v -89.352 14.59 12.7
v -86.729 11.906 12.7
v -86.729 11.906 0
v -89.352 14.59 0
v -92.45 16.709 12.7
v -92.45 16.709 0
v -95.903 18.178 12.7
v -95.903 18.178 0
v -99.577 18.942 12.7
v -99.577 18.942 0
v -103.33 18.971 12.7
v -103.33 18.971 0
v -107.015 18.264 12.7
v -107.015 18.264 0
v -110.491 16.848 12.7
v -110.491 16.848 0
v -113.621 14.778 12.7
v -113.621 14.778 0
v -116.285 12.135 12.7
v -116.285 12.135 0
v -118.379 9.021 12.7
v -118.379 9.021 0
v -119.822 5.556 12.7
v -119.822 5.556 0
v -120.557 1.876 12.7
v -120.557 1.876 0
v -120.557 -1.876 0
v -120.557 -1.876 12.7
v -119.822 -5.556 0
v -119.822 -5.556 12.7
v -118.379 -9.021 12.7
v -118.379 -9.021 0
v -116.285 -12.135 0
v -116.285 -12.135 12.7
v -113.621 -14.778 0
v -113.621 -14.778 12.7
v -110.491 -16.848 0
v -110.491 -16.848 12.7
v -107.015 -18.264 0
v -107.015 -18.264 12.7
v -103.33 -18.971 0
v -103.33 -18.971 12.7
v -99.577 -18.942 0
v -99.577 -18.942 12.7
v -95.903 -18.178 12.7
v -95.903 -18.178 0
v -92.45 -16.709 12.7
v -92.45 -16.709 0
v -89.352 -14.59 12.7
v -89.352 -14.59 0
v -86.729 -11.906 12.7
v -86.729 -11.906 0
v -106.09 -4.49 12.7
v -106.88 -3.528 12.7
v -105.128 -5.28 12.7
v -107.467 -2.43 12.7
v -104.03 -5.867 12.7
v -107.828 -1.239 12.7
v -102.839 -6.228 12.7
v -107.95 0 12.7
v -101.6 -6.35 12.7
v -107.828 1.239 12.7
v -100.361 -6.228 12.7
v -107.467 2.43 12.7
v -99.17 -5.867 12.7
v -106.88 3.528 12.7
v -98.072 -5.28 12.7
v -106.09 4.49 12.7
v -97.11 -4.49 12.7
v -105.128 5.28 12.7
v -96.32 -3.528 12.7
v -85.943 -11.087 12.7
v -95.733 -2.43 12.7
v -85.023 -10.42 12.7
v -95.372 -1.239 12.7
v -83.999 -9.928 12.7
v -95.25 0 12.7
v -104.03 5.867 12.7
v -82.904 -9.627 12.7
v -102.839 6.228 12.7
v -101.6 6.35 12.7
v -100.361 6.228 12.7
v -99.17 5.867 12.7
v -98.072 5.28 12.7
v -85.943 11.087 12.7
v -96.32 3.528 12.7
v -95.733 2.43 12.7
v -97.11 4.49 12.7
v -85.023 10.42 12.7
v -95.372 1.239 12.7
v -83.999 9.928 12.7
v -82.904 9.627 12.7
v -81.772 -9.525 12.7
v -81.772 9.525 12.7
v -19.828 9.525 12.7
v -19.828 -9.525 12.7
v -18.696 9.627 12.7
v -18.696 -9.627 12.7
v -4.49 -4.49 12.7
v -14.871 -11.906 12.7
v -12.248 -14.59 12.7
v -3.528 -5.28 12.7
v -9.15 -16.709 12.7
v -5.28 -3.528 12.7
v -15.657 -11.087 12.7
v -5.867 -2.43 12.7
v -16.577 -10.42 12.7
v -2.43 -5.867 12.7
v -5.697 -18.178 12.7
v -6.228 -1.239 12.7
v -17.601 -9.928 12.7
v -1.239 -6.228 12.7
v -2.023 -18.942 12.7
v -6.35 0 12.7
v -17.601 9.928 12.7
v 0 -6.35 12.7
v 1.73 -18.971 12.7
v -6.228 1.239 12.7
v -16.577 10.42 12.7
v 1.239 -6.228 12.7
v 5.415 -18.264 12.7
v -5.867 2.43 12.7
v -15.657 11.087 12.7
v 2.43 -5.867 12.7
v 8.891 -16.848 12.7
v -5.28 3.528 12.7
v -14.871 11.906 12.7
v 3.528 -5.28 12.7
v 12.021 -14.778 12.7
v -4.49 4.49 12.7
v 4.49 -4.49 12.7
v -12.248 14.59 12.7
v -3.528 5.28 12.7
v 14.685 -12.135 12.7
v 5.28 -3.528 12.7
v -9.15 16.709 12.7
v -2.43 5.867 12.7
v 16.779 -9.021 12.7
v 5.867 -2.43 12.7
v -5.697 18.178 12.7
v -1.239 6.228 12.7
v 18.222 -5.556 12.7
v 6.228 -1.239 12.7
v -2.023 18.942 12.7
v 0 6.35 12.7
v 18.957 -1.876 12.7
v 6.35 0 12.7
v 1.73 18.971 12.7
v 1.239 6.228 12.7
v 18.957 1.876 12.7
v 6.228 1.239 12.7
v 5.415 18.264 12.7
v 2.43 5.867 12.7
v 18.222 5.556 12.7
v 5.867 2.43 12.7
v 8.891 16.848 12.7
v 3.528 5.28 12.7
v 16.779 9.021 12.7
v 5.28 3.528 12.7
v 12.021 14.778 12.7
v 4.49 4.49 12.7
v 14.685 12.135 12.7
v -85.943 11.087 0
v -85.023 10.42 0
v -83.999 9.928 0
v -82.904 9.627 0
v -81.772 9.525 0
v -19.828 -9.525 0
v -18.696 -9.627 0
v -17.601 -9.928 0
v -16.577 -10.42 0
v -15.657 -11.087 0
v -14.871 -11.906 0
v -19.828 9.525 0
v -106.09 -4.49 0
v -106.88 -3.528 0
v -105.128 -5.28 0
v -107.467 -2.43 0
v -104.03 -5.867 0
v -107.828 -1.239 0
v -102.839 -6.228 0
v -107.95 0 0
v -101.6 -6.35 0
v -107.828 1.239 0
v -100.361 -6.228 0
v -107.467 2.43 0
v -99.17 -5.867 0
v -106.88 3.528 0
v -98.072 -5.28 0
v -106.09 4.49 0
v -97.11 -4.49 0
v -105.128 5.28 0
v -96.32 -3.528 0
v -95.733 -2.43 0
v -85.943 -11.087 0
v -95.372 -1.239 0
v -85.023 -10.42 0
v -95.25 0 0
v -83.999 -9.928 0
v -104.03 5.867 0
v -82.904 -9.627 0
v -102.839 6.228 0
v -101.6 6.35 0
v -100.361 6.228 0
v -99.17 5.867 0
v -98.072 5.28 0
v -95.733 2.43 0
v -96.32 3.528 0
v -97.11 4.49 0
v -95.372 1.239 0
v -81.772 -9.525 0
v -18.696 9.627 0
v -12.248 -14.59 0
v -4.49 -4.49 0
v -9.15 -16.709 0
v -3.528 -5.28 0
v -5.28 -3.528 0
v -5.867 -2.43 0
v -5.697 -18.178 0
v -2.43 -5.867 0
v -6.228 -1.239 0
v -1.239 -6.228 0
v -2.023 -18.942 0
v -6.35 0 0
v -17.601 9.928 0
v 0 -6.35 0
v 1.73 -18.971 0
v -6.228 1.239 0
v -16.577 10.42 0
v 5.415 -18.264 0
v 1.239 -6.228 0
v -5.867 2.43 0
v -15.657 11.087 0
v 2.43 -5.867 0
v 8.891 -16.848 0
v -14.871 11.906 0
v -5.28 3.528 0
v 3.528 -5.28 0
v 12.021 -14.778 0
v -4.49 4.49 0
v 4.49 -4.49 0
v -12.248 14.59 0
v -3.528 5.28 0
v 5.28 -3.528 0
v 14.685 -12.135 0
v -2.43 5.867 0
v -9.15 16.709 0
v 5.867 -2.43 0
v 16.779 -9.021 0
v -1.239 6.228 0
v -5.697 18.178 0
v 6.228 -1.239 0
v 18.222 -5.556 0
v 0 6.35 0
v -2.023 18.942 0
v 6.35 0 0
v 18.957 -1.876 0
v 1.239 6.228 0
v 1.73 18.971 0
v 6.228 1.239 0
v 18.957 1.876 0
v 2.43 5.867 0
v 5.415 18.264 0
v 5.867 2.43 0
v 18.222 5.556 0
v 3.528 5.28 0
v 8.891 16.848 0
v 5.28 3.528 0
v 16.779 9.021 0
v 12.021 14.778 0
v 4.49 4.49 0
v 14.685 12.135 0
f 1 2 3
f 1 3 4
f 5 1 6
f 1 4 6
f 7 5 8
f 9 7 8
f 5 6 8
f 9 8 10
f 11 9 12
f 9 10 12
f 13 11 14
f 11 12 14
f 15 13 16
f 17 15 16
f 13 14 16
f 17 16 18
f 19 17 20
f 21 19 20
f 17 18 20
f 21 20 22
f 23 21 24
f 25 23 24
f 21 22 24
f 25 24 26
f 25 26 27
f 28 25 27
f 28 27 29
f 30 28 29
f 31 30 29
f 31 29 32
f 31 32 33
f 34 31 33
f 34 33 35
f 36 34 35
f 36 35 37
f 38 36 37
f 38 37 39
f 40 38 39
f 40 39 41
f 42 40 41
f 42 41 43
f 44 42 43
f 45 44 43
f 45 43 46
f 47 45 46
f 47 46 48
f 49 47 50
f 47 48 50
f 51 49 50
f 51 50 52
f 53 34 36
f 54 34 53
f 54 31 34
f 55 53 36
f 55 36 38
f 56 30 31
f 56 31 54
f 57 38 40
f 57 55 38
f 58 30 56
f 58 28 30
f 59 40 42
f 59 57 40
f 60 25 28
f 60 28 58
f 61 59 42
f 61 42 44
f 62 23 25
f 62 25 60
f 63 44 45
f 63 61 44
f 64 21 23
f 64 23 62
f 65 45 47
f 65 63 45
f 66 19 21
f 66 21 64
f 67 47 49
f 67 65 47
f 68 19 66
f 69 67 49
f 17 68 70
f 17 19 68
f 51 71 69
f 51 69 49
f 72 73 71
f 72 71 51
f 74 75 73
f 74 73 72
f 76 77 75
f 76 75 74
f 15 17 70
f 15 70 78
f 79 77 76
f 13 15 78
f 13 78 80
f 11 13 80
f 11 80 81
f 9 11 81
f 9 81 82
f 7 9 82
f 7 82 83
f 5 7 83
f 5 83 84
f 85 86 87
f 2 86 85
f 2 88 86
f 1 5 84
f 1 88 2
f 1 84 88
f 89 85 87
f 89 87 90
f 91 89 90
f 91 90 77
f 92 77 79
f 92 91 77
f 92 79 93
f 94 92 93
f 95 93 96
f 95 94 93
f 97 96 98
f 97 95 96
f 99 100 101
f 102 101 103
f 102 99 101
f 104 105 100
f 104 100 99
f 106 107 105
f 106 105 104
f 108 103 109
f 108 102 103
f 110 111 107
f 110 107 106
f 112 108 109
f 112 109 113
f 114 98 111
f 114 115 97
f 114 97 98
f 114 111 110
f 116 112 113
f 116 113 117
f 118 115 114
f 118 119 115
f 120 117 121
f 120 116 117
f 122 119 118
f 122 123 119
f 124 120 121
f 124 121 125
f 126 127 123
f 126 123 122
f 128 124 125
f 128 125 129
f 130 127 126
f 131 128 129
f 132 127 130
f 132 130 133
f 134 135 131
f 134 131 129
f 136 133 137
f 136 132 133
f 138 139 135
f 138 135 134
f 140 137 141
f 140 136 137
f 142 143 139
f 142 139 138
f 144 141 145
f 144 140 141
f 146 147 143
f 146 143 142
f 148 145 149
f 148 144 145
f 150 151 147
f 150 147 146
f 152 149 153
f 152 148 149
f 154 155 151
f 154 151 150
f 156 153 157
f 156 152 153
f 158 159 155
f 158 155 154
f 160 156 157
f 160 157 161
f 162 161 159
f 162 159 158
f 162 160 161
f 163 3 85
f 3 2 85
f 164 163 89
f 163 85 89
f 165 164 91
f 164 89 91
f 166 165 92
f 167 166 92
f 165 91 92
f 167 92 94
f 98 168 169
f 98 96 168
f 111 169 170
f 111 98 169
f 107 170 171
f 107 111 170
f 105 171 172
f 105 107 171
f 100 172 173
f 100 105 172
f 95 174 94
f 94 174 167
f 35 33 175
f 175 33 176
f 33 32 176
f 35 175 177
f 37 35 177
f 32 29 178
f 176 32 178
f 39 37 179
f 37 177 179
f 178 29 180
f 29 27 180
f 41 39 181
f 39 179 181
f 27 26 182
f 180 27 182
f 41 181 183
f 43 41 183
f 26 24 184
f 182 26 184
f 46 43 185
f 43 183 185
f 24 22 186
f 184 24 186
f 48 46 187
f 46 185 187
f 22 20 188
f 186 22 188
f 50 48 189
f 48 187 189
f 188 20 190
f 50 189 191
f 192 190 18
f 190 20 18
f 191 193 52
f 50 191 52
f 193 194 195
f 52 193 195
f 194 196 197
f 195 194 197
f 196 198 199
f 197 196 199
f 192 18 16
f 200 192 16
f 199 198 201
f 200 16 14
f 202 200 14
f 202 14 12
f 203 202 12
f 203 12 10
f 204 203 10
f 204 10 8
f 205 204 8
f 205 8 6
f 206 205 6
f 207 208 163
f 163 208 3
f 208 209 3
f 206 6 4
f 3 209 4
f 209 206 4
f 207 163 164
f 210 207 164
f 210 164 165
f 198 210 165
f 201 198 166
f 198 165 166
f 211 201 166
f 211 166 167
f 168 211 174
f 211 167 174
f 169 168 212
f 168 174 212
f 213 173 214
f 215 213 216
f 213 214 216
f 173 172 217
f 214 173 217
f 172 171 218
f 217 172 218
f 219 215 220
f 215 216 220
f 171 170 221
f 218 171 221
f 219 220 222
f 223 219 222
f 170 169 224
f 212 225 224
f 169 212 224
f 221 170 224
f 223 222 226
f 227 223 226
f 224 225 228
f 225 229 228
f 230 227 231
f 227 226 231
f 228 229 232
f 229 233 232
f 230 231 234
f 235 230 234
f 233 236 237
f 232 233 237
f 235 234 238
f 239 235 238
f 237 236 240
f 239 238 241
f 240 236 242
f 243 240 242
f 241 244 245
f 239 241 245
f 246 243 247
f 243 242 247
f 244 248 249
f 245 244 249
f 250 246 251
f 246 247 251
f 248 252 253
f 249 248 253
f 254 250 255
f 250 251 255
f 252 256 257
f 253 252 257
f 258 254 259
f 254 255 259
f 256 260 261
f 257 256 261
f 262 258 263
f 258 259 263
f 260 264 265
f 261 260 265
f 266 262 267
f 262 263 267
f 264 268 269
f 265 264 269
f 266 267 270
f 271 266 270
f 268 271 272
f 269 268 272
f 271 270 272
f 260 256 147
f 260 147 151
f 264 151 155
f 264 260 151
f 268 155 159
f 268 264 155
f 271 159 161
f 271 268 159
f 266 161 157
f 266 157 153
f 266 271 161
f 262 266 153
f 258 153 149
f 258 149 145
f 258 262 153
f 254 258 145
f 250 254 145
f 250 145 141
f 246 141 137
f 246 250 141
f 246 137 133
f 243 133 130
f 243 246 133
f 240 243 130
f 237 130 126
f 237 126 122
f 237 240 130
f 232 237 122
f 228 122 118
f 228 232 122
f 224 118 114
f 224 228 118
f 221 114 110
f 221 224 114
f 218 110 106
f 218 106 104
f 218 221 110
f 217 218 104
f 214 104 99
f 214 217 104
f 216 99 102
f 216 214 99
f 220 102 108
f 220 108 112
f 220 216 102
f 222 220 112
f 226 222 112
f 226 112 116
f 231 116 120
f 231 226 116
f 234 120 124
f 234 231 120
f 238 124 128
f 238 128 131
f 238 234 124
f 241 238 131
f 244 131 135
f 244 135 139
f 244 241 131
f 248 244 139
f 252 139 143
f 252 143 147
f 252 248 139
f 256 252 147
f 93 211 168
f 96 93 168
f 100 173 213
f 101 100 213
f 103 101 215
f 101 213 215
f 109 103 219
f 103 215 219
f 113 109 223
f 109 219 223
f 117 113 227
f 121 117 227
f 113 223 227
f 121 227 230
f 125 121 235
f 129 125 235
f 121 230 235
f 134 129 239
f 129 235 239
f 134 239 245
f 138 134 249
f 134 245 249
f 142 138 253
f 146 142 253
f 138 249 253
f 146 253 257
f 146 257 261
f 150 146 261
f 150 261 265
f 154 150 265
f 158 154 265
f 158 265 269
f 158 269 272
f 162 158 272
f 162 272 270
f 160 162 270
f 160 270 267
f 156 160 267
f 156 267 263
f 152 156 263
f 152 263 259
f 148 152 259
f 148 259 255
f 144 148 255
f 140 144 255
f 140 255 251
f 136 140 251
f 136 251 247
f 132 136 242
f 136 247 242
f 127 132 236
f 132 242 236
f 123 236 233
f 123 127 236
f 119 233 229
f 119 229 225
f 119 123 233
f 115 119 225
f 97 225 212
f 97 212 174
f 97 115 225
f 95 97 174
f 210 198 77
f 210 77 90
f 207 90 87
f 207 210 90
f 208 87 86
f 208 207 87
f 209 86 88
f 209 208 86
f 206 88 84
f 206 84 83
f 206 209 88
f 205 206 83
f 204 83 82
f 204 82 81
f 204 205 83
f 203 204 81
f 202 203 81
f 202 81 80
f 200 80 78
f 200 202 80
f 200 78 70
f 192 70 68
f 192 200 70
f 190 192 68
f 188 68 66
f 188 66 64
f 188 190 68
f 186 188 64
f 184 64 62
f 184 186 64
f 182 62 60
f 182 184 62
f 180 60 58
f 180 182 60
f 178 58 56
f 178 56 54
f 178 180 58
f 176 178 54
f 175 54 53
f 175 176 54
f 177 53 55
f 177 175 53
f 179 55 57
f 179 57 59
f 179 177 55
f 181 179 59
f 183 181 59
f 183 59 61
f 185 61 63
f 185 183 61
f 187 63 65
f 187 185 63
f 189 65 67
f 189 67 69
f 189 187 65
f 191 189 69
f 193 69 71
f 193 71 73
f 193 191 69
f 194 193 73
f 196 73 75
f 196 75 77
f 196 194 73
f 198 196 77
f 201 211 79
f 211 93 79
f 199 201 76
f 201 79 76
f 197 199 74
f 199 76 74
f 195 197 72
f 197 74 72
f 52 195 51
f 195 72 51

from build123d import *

# Parameters (mm, degrees)
SKETCH1_R           = 6.35
BOSS_EXTRUDE1_DEPTH = 12.7
FILLET1_R           = 6.35


with BuildPart() as part:
    # Sketch1 → Boss-Extrude1 (new body)
    with BuildSketch(Plane.XY):
        with BuildLine():
            Line((-85.102216058, -9.525), (-16.497783942, -9.525))
            ThreePointArc((-16.497783942, -9.525), (19.05, 0), (-16.497783942, 9.525))
            Line((-16.497783942, 9.525), (-85.102216058, 9.525))
            ThreePointArc((-85.102216058, 9.525), (-120.65, 0), (-85.102216058, -9.525))
        make_face()
        Circle(SKETCH1_R, mode=Mode.SUBTRACT)
        with Locations((-101.6, 0)):
            Circle(SKETCH1_R, mode=Mode.SUBTRACT)
    extrude(amount=BOSS_EXTRUDE1_DEPTH)

    # Fillet1
    fillet1_edges = [part.edges().sort_by_distance(p)[0] for p in [
        (-85.102216058, 9.525, 6.35),
        (-16.497783942, 9.525, 6.35),
        (-16.497783942, -9.525, 6.35),
        (-85.102216058, -9.525, 6.35),
    ]]
    fillet(fillet1_edges, radius=FILLET1_R)


solid = part.part
